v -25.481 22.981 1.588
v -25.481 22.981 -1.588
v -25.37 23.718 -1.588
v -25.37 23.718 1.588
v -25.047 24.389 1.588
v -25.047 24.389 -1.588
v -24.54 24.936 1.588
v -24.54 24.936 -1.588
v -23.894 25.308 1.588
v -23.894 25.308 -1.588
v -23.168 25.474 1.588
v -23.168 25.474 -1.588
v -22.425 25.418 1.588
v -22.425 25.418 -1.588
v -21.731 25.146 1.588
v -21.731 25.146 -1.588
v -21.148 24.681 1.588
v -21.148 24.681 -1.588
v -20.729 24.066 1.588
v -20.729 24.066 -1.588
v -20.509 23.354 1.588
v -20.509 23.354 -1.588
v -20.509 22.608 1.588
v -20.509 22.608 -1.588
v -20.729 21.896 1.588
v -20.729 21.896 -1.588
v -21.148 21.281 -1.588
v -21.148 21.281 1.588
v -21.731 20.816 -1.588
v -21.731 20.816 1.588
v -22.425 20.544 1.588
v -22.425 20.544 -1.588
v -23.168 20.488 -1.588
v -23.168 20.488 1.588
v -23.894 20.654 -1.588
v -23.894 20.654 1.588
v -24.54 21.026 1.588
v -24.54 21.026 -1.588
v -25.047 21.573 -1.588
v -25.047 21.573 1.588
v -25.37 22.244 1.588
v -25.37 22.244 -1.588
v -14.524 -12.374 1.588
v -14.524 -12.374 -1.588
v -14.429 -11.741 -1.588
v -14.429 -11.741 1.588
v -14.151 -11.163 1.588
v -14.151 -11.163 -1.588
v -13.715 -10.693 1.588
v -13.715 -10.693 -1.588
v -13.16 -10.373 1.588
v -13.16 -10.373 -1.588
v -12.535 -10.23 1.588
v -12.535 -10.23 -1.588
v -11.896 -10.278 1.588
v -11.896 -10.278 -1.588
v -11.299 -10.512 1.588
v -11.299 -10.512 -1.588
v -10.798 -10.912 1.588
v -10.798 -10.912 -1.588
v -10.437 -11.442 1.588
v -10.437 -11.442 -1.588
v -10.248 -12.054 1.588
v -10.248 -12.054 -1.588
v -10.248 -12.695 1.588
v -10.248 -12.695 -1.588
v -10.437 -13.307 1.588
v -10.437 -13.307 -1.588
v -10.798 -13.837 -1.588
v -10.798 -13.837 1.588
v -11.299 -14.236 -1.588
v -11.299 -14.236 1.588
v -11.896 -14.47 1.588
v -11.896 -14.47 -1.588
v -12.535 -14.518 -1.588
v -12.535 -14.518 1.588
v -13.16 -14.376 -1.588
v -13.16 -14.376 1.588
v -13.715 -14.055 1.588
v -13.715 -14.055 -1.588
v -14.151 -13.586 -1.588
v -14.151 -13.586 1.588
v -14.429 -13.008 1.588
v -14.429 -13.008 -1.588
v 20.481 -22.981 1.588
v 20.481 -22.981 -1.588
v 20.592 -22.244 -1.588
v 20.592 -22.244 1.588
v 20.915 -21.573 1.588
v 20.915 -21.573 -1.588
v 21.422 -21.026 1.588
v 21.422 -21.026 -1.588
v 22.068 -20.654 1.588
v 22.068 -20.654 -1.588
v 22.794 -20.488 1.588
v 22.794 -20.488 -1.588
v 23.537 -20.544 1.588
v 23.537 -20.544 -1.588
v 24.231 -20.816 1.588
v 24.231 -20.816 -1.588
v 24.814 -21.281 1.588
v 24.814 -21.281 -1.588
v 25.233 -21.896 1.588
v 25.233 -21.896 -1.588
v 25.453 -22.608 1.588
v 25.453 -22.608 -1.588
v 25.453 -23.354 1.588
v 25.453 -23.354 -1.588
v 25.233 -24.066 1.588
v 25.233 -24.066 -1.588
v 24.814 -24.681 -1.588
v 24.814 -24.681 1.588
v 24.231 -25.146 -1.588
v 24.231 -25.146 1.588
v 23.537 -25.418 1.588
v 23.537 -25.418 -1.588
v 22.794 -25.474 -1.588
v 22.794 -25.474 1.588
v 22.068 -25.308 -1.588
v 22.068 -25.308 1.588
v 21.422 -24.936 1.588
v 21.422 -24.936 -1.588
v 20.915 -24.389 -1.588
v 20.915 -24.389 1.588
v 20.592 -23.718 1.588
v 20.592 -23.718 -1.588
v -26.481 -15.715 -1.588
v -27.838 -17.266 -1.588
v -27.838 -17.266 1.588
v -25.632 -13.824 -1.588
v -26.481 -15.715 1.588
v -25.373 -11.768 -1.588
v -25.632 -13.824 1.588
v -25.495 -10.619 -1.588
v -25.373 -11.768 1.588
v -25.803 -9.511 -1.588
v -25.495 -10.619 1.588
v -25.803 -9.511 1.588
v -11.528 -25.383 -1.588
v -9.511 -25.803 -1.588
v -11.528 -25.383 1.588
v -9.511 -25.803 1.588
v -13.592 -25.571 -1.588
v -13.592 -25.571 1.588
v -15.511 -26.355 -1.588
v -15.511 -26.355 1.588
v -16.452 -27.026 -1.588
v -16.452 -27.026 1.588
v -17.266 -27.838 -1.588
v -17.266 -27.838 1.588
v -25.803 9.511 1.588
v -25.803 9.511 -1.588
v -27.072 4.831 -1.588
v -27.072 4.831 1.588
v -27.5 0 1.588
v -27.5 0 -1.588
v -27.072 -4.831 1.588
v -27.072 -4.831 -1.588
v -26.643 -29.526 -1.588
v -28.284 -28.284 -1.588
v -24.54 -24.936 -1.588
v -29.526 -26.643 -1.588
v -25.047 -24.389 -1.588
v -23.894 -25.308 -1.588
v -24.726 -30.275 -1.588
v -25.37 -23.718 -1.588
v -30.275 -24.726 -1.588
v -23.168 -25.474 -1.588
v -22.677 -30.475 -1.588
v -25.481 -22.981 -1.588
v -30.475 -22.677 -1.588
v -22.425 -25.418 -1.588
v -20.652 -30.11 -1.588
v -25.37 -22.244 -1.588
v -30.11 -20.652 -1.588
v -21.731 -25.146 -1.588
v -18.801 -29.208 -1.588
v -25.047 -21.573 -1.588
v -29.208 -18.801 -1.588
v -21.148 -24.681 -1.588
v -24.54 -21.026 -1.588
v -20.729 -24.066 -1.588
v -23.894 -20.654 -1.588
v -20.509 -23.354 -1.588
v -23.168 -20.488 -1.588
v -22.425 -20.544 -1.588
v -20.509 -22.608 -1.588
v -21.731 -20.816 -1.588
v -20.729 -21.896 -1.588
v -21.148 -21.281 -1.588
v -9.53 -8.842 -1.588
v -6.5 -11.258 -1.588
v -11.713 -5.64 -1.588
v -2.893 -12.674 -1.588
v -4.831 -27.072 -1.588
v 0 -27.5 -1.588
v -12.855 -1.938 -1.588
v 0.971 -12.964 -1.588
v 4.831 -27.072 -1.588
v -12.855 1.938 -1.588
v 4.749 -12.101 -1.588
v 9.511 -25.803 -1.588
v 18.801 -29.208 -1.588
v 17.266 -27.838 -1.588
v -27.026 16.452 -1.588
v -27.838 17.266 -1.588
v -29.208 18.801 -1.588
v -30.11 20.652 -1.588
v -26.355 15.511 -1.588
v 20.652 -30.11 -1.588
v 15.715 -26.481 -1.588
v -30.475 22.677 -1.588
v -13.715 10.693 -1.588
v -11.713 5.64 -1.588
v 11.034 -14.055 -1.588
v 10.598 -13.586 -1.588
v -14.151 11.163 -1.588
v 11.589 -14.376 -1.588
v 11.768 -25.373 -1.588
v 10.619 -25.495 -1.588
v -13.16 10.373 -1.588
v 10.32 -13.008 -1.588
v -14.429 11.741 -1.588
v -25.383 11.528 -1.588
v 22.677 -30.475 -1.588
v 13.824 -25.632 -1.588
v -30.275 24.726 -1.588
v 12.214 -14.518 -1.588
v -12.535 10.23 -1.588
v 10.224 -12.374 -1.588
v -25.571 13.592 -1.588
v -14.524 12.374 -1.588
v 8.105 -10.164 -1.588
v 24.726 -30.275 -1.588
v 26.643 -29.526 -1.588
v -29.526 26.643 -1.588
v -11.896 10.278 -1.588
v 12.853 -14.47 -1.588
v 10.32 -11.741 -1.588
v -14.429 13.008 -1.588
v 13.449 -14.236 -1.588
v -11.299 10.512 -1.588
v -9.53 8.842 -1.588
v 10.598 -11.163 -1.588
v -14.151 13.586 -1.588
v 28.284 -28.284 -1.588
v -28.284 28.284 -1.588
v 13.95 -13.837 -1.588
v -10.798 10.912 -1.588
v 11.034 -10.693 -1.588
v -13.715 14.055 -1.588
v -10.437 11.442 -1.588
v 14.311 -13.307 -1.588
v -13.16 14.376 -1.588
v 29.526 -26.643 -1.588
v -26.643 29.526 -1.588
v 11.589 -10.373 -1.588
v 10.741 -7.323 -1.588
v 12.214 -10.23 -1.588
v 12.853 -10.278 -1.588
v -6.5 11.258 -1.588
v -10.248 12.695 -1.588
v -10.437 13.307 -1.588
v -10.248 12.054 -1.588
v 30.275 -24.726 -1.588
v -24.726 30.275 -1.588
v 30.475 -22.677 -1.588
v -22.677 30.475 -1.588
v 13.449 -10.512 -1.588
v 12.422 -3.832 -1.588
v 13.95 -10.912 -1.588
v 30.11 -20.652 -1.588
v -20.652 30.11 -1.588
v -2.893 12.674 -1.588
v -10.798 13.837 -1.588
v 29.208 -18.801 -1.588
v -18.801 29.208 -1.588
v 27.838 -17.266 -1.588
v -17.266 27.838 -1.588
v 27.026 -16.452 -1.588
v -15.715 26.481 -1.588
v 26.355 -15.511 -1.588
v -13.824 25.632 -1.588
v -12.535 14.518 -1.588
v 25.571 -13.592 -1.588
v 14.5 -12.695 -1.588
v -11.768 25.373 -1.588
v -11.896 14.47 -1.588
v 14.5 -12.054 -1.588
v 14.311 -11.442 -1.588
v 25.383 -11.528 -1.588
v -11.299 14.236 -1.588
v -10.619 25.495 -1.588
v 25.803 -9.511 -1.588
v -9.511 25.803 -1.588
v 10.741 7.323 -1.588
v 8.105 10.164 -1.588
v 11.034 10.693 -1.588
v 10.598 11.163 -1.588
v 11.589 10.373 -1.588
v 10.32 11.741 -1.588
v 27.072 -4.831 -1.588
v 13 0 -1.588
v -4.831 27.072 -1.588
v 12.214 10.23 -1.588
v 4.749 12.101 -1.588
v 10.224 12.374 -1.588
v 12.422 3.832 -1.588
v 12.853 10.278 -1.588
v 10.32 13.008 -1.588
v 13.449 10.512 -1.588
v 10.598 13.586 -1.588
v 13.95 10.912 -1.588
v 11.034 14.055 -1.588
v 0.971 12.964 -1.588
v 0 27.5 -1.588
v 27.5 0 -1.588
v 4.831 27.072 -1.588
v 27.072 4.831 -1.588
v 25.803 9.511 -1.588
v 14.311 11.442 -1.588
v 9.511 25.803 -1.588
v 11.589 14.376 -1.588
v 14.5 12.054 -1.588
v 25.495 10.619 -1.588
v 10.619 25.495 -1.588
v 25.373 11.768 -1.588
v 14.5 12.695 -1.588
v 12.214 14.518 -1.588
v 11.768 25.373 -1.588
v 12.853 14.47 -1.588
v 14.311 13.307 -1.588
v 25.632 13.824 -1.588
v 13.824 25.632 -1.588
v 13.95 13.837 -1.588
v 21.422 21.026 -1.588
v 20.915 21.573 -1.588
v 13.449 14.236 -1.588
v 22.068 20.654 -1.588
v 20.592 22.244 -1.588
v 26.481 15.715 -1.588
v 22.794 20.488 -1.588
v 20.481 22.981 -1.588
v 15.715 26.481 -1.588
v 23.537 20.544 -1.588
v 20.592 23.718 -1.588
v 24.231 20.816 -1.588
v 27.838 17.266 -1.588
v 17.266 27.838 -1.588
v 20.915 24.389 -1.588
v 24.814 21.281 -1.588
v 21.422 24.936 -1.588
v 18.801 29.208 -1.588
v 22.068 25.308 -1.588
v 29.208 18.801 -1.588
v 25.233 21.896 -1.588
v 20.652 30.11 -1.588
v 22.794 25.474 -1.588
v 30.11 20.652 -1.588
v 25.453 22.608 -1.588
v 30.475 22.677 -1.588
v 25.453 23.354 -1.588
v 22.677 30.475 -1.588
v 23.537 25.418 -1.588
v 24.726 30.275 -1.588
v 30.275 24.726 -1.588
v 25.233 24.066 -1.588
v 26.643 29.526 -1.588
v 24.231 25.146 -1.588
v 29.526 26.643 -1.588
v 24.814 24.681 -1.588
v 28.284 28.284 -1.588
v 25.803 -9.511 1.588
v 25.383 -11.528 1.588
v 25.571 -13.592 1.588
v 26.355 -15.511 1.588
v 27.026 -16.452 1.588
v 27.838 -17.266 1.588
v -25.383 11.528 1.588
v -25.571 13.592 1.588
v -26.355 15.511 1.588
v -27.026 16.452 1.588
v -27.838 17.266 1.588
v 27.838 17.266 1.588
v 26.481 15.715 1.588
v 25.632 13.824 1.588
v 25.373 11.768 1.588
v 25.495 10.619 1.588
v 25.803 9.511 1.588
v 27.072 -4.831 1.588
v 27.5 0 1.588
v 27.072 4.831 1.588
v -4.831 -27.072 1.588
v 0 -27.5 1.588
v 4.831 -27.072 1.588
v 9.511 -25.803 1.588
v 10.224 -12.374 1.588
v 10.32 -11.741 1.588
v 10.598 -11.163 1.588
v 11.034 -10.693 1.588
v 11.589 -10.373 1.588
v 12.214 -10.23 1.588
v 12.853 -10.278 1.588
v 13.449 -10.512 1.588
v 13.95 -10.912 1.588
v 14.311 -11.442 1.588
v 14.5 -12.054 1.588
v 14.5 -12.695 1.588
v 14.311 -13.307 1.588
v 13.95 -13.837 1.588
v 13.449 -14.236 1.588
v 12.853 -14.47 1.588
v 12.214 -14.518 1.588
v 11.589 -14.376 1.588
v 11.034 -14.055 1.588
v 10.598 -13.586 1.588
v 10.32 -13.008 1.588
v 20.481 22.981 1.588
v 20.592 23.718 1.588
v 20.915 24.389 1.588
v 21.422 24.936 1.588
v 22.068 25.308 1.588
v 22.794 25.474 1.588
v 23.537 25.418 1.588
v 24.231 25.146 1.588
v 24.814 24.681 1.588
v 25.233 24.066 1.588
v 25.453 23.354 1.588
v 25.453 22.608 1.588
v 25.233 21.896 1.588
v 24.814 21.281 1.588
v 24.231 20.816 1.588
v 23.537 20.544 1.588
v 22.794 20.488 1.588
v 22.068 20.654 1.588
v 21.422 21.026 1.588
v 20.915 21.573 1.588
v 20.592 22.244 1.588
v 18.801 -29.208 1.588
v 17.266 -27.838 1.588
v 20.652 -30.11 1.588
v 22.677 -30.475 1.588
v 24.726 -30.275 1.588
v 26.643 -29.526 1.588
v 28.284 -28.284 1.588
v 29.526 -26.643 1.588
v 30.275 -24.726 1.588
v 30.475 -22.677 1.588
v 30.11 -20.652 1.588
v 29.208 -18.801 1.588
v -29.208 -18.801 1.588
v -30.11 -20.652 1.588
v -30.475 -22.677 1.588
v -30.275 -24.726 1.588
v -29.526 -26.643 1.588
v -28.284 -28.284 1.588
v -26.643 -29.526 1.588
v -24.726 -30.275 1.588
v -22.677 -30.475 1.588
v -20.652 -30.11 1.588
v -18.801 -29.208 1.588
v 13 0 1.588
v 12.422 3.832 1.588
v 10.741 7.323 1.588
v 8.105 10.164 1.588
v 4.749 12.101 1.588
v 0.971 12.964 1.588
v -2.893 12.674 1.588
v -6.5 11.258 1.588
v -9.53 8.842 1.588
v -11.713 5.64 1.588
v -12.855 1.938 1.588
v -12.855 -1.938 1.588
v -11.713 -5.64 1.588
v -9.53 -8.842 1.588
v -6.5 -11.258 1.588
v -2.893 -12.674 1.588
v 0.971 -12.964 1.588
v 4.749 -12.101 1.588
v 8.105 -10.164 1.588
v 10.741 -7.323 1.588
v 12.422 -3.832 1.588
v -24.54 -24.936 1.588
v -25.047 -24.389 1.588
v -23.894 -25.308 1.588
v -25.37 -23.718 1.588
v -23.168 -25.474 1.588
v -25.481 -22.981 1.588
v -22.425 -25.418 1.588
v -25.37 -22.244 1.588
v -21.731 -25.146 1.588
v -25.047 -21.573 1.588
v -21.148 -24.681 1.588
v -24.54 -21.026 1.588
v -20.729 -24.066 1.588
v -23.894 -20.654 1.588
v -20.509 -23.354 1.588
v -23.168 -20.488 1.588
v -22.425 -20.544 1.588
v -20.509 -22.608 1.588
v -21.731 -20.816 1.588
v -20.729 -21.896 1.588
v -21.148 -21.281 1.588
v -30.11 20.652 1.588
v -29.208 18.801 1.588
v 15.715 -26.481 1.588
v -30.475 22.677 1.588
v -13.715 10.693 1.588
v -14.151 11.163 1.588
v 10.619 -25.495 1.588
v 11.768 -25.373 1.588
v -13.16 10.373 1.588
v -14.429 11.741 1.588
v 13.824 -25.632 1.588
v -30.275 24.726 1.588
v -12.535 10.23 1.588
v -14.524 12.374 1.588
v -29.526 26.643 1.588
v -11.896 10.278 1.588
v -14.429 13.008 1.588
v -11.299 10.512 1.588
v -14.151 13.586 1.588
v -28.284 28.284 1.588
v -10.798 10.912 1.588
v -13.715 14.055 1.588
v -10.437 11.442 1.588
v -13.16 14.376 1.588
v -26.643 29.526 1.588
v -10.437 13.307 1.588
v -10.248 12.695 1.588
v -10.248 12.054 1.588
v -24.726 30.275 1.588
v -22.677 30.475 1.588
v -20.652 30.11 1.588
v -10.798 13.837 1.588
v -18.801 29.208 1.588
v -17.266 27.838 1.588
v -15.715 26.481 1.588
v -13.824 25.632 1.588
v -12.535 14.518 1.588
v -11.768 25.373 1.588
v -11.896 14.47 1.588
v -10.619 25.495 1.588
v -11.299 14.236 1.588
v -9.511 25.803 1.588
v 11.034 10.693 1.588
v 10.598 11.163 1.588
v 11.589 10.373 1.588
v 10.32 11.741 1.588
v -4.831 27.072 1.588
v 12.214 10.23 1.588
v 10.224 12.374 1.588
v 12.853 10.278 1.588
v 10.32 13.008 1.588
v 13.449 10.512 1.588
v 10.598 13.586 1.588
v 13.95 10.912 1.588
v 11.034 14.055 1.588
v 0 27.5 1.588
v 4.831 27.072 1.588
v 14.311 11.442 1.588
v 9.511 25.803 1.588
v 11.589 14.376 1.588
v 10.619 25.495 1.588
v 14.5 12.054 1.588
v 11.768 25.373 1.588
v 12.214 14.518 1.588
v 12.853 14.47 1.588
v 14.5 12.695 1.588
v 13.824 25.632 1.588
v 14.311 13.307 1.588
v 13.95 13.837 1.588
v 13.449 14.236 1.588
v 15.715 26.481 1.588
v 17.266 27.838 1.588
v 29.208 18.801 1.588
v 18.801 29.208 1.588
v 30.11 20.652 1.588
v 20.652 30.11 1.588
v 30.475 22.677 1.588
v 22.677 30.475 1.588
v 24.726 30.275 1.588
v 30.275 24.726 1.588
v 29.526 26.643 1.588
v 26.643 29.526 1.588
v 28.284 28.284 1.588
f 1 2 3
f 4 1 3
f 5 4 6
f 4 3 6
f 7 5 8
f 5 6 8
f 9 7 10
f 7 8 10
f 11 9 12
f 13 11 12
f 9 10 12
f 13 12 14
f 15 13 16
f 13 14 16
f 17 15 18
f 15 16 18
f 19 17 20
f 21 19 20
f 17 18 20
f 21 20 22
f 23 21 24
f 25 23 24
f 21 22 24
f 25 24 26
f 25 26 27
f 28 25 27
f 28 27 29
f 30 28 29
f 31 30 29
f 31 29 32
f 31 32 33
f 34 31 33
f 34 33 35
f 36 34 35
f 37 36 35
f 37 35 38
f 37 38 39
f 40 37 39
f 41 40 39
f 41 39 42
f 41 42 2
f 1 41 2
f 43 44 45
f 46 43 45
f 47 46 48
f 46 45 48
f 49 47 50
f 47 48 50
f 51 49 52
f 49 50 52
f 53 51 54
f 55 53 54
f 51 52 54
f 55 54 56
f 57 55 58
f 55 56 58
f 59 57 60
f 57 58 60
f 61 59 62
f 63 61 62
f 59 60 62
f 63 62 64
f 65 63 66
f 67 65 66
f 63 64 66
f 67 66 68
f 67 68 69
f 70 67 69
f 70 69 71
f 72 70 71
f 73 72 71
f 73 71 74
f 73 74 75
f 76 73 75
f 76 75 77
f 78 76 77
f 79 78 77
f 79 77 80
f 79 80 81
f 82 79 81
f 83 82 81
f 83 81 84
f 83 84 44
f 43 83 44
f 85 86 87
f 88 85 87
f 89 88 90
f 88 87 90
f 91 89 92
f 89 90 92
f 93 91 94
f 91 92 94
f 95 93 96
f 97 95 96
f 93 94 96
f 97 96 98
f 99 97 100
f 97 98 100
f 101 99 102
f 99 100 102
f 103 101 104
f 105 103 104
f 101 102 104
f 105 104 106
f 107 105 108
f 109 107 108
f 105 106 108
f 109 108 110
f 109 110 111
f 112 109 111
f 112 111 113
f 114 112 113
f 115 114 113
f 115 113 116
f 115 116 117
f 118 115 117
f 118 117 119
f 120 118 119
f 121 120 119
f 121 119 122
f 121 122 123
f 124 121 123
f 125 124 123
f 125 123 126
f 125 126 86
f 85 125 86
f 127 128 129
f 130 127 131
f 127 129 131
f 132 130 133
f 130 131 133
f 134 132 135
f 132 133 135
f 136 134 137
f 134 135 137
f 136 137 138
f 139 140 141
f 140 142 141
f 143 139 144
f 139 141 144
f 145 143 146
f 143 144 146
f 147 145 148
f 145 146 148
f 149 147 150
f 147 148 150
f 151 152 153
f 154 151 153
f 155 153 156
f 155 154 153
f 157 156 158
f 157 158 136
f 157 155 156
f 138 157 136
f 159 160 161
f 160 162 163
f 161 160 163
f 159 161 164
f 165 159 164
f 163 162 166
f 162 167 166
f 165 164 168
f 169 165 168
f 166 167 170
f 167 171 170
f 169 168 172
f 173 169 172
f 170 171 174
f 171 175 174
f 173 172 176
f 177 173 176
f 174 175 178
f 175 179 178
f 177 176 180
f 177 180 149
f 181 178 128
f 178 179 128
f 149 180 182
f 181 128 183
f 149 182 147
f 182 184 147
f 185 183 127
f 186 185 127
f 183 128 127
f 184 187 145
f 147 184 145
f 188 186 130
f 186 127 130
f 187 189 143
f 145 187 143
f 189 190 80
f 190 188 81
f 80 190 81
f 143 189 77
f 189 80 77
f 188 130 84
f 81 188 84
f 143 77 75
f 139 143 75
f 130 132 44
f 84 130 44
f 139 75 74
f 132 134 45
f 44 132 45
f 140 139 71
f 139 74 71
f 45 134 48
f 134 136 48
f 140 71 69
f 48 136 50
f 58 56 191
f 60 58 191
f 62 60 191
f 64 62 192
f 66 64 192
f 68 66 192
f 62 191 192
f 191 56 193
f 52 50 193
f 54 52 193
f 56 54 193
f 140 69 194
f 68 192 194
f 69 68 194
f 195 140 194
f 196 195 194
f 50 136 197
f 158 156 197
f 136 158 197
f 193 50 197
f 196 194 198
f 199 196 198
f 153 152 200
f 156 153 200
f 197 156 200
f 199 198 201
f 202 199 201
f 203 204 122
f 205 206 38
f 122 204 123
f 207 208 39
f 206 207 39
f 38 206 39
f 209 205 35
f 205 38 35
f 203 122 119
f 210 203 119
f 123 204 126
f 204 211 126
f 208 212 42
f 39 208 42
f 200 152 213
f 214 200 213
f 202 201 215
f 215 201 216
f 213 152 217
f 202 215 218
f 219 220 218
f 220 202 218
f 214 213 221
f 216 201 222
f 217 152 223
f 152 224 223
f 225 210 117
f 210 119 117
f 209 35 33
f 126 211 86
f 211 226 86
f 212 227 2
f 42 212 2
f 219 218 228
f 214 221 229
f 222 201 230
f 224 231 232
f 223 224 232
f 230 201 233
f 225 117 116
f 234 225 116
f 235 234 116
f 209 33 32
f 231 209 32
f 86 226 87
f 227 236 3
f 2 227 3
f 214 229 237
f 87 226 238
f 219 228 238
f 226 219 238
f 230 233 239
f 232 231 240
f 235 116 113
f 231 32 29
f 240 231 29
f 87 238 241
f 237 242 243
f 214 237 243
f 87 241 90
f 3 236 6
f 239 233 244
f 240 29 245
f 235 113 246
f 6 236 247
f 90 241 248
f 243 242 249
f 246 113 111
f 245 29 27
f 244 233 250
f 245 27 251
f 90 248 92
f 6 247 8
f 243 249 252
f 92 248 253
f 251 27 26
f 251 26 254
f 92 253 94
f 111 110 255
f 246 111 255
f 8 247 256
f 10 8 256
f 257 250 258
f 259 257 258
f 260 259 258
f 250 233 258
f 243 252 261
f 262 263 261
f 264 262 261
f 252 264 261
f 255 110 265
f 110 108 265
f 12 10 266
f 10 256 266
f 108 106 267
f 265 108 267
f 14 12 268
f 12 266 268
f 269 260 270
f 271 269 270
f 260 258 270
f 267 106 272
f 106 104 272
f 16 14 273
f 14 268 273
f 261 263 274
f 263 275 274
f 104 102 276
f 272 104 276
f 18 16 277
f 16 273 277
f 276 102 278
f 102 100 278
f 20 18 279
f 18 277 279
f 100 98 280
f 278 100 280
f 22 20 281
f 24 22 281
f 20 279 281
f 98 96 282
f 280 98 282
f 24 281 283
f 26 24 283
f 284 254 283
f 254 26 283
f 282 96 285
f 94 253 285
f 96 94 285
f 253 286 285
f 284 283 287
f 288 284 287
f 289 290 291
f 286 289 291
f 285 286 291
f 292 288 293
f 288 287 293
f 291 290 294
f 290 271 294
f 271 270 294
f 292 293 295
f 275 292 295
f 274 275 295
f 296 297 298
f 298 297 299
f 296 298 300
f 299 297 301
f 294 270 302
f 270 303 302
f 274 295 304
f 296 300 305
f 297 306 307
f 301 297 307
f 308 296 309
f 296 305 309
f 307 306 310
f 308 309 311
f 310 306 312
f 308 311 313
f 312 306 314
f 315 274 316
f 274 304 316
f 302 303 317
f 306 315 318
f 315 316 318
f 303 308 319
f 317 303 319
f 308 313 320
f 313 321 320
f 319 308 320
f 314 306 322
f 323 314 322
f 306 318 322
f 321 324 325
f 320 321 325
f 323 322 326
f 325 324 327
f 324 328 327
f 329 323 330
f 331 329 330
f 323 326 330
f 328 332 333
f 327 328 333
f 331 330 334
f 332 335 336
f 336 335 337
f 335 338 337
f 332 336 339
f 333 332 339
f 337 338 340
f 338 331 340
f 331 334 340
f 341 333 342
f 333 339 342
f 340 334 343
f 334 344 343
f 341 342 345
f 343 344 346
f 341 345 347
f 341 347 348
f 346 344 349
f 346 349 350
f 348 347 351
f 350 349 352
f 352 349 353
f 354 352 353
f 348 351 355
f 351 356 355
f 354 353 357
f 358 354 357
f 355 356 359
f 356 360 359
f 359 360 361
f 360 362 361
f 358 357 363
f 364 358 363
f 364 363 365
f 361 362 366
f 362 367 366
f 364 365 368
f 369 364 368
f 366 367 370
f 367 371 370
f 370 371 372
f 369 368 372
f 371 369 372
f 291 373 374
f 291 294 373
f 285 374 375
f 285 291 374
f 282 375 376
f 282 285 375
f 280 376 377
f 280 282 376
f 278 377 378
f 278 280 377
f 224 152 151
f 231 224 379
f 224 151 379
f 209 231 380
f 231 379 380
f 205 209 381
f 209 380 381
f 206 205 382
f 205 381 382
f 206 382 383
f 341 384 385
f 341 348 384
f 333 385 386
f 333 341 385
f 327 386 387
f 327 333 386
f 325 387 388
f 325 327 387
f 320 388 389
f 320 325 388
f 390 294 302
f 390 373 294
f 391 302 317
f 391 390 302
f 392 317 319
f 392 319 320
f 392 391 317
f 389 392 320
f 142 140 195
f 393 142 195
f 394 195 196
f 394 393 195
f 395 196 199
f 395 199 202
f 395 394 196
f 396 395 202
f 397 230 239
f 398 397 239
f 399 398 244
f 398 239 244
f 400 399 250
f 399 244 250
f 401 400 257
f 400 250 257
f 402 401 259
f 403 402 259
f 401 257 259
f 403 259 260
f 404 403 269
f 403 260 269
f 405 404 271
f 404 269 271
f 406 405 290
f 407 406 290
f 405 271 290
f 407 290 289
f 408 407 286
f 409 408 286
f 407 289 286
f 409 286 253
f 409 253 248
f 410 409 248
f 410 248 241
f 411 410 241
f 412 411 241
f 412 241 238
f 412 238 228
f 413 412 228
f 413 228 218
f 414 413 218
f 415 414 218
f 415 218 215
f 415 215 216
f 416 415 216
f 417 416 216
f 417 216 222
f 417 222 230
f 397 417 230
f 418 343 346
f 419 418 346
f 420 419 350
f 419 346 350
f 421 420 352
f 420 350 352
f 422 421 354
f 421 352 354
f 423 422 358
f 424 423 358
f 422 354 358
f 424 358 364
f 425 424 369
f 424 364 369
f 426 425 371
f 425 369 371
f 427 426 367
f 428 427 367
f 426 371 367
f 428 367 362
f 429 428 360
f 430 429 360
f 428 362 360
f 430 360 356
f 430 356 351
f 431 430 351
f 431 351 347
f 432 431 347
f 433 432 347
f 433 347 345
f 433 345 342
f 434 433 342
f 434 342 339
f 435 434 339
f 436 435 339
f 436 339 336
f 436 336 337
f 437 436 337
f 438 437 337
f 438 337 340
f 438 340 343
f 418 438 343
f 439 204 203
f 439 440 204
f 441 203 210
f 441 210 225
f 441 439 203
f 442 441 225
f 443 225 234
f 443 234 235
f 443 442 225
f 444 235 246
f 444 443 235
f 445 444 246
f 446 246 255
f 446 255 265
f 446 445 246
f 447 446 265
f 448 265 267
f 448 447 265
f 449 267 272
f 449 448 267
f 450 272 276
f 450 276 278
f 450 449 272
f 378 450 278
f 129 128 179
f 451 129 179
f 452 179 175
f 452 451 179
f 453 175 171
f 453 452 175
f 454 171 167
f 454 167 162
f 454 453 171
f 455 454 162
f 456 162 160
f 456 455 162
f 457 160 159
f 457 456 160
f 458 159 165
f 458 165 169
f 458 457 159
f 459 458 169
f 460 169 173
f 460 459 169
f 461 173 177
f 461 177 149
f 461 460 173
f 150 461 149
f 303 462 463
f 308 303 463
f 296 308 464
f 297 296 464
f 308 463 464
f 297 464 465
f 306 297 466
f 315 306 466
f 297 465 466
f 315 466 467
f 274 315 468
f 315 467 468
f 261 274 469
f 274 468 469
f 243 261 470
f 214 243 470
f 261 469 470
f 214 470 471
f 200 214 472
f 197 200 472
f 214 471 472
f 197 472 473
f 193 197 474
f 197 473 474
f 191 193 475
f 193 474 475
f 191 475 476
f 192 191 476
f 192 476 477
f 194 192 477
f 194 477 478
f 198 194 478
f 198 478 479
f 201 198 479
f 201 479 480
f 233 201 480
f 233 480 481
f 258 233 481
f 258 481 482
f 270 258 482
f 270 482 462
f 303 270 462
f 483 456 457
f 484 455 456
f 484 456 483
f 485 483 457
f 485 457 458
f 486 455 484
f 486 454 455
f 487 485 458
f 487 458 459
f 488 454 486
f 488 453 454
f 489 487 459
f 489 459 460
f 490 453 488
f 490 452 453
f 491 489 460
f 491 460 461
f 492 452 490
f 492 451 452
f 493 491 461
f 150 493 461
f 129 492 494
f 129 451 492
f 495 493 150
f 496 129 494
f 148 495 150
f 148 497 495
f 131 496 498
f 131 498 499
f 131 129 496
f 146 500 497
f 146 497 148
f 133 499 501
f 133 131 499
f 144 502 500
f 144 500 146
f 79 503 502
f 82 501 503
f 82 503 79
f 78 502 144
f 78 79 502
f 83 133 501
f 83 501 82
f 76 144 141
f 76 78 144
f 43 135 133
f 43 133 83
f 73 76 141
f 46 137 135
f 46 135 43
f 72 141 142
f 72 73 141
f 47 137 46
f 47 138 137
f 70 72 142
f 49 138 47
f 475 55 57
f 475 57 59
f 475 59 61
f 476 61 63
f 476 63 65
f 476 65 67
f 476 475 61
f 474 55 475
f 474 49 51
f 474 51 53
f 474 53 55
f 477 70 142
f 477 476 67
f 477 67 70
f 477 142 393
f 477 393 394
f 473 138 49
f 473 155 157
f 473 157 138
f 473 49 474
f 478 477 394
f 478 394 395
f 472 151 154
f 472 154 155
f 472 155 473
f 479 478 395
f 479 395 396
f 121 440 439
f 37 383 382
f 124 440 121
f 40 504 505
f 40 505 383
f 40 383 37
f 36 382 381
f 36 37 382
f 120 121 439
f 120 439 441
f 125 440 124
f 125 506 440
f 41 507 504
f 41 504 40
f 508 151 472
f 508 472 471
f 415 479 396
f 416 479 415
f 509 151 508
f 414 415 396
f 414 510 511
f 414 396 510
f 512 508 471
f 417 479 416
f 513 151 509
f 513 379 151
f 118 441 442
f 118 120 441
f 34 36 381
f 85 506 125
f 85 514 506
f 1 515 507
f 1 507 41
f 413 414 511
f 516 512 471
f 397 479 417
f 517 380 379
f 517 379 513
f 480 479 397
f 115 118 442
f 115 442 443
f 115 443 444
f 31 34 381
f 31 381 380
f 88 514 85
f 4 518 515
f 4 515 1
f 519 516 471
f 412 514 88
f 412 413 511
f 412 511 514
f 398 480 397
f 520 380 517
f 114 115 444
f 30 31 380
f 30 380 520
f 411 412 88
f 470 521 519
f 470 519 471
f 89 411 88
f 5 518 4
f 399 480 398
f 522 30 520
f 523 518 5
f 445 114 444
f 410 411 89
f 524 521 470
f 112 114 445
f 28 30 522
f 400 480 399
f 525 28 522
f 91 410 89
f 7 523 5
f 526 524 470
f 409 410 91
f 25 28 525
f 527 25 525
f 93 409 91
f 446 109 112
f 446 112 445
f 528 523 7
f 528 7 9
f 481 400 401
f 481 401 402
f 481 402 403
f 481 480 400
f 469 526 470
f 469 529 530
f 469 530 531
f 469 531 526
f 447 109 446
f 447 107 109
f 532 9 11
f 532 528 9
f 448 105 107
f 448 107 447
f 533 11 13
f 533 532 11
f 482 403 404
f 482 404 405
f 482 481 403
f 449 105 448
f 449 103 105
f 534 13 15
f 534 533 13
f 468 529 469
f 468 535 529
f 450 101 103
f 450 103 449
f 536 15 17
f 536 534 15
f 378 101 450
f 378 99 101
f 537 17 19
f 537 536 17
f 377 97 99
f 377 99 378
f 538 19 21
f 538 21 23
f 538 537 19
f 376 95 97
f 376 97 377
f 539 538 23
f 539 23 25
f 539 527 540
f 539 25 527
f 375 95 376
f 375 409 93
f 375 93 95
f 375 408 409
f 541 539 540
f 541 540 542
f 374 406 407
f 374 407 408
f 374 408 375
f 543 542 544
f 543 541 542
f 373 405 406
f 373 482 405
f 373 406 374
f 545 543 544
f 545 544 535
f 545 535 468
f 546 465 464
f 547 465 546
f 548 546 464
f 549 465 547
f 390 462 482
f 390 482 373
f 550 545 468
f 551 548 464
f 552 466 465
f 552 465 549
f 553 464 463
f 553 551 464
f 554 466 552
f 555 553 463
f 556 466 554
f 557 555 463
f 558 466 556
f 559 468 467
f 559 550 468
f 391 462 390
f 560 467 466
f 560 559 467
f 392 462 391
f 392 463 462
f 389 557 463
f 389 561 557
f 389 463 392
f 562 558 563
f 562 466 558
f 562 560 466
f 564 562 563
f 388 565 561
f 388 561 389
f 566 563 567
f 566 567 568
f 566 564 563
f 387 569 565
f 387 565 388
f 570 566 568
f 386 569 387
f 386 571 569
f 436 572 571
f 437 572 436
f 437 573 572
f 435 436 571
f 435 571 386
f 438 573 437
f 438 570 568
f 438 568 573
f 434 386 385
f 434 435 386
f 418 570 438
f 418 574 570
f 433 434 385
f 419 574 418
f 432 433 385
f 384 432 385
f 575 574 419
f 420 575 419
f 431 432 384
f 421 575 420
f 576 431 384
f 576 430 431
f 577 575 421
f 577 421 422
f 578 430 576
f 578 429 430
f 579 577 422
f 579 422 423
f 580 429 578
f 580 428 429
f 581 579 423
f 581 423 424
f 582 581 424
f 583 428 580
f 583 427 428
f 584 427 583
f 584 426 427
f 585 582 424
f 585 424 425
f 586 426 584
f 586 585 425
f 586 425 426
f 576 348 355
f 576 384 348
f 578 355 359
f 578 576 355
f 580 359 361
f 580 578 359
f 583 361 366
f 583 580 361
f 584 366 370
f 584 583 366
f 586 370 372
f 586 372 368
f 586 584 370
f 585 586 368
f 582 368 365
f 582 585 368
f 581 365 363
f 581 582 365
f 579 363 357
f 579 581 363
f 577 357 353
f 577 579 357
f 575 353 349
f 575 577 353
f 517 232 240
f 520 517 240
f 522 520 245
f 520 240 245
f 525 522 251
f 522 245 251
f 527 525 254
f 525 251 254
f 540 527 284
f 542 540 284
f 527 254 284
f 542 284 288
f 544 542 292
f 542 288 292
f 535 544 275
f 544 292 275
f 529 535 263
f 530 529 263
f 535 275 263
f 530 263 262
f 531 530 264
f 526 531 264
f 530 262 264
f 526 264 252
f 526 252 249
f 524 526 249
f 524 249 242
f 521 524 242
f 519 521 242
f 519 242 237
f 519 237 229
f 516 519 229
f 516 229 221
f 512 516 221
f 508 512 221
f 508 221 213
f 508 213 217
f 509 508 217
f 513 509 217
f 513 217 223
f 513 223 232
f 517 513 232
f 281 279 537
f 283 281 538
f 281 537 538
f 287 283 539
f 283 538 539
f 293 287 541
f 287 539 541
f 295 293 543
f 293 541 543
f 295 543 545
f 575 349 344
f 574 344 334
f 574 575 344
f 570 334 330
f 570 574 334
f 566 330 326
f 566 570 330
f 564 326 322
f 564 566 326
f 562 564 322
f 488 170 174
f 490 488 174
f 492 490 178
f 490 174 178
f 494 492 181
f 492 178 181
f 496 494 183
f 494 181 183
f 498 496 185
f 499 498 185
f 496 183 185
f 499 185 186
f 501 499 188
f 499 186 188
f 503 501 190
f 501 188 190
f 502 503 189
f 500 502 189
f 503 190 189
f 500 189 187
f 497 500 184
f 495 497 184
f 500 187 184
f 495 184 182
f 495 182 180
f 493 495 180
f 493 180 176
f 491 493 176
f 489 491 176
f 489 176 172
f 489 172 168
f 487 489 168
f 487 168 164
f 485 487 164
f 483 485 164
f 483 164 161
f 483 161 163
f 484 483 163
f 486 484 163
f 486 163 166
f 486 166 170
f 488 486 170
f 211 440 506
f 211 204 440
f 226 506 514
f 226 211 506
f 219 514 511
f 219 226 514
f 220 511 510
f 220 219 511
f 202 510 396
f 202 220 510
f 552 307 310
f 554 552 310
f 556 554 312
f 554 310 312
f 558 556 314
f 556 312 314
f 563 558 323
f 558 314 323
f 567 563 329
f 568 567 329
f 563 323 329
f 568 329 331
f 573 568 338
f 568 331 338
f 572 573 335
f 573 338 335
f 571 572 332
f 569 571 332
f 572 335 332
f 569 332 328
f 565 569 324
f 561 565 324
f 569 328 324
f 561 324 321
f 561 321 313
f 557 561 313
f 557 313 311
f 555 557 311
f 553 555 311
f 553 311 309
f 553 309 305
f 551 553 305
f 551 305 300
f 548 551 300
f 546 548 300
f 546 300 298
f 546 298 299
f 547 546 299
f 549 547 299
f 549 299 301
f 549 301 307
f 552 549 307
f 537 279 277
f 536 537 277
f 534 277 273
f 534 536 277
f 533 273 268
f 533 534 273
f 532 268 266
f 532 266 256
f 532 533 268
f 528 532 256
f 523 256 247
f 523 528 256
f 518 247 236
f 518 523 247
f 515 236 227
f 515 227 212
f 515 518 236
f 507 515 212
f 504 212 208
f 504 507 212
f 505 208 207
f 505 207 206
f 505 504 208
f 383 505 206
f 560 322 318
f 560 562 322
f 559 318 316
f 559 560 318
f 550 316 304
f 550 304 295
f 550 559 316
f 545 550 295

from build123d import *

# Parameters (mm, degrees)
SKETCH1_R                             = 7.5
SKETCH1_R_2                           = 27.5
F_125_IN_SHEET_DEPTH                  = 1.5875
FILLET1_R                             = 7
SKETCH2_R                             = 13
CUT_EXTRUDE1_DEPTH                    = 44.223370409
M4_CLEARANCE_HOLE1_D                  = 4.3
F_5_0_REAMED_OVER_FOR_SHOULDER_BOLT_D = 5


with BuildPart() as part:
    # Sketch1 → .125 in sheet (new, symmetric)
    with BuildSketch(Plane.XY):
        with Locations((22.980970389, 22.980970389)):
            Circle(SKETCH1_R)
        Circle(SKETCH1_R_2)
        with Locations((-22.980970389, 22.980970389)):
            Circle(SKETCH1_R)
        with Locations((-22.980970389, -22.980970389)):
            Circle(SKETCH1_R)
        with Locations((22.980970389, -22.980970389)):
            Circle(SKETCH1_R)
    extrude(amount=F_125_IN_SHEET_DEPTH, both=True)

    # Fillet1
    fillet1_edges = [part.edges().sort_by_distance(p)[0] for p in [
        (15.485317723, -22.725644876, 0),
        (-15.485317723, -22.725644876, 0),
        (-22.725644876, -15.485317723, 0),
        (-22.725644876, 15.485317723, 0),
        (-15.485317723, 22.725644876, 0),
        (15.485317723, 22.725644876, 0),
        (22.725644876, 15.485317723, 0),
        (22.725644876, -15.485317723, 0),
    ]]
    fillet(fillet1_edges, radius=FILLET1_R)

    # Sketch2 → Cut-Extrude1 (cut, through all)
    with BuildSketch(Plane.XY.offset(1.5875)):
        Circle(SKETCH2_R)
    extrude(amount=-CUT_EXTRUDE1_DEPTH, mode=Mode.SUBTRACT)

    # M4 Clearance Hole1 (through all)
    with Locations(Plane.XY.offset(1.5875)):
        with Locations((-12.374368671, 12.374368671), (12.374368671, 12.374368671), (12.374368671, -12.374368671), (-12.374368671, -12.374368671)):
            Hole(M4_CLEARANCE_HOLE1_D / 2)

    # Ø5.0 Reamed over for shoulder bolt (through all)
    with Locations(Plane.XY.offset(1.5875)):
        with Locations((-22.980970389, 22.980970389), (22.980970389, 22.980970389), (22.980970389, -22.980970389), (-22.980970389, -22.980970389)):
            Hole(F_5_0_REAMED_OVER_FOR_SHOULDER_BOLT_D / 2)


solid = part.part
